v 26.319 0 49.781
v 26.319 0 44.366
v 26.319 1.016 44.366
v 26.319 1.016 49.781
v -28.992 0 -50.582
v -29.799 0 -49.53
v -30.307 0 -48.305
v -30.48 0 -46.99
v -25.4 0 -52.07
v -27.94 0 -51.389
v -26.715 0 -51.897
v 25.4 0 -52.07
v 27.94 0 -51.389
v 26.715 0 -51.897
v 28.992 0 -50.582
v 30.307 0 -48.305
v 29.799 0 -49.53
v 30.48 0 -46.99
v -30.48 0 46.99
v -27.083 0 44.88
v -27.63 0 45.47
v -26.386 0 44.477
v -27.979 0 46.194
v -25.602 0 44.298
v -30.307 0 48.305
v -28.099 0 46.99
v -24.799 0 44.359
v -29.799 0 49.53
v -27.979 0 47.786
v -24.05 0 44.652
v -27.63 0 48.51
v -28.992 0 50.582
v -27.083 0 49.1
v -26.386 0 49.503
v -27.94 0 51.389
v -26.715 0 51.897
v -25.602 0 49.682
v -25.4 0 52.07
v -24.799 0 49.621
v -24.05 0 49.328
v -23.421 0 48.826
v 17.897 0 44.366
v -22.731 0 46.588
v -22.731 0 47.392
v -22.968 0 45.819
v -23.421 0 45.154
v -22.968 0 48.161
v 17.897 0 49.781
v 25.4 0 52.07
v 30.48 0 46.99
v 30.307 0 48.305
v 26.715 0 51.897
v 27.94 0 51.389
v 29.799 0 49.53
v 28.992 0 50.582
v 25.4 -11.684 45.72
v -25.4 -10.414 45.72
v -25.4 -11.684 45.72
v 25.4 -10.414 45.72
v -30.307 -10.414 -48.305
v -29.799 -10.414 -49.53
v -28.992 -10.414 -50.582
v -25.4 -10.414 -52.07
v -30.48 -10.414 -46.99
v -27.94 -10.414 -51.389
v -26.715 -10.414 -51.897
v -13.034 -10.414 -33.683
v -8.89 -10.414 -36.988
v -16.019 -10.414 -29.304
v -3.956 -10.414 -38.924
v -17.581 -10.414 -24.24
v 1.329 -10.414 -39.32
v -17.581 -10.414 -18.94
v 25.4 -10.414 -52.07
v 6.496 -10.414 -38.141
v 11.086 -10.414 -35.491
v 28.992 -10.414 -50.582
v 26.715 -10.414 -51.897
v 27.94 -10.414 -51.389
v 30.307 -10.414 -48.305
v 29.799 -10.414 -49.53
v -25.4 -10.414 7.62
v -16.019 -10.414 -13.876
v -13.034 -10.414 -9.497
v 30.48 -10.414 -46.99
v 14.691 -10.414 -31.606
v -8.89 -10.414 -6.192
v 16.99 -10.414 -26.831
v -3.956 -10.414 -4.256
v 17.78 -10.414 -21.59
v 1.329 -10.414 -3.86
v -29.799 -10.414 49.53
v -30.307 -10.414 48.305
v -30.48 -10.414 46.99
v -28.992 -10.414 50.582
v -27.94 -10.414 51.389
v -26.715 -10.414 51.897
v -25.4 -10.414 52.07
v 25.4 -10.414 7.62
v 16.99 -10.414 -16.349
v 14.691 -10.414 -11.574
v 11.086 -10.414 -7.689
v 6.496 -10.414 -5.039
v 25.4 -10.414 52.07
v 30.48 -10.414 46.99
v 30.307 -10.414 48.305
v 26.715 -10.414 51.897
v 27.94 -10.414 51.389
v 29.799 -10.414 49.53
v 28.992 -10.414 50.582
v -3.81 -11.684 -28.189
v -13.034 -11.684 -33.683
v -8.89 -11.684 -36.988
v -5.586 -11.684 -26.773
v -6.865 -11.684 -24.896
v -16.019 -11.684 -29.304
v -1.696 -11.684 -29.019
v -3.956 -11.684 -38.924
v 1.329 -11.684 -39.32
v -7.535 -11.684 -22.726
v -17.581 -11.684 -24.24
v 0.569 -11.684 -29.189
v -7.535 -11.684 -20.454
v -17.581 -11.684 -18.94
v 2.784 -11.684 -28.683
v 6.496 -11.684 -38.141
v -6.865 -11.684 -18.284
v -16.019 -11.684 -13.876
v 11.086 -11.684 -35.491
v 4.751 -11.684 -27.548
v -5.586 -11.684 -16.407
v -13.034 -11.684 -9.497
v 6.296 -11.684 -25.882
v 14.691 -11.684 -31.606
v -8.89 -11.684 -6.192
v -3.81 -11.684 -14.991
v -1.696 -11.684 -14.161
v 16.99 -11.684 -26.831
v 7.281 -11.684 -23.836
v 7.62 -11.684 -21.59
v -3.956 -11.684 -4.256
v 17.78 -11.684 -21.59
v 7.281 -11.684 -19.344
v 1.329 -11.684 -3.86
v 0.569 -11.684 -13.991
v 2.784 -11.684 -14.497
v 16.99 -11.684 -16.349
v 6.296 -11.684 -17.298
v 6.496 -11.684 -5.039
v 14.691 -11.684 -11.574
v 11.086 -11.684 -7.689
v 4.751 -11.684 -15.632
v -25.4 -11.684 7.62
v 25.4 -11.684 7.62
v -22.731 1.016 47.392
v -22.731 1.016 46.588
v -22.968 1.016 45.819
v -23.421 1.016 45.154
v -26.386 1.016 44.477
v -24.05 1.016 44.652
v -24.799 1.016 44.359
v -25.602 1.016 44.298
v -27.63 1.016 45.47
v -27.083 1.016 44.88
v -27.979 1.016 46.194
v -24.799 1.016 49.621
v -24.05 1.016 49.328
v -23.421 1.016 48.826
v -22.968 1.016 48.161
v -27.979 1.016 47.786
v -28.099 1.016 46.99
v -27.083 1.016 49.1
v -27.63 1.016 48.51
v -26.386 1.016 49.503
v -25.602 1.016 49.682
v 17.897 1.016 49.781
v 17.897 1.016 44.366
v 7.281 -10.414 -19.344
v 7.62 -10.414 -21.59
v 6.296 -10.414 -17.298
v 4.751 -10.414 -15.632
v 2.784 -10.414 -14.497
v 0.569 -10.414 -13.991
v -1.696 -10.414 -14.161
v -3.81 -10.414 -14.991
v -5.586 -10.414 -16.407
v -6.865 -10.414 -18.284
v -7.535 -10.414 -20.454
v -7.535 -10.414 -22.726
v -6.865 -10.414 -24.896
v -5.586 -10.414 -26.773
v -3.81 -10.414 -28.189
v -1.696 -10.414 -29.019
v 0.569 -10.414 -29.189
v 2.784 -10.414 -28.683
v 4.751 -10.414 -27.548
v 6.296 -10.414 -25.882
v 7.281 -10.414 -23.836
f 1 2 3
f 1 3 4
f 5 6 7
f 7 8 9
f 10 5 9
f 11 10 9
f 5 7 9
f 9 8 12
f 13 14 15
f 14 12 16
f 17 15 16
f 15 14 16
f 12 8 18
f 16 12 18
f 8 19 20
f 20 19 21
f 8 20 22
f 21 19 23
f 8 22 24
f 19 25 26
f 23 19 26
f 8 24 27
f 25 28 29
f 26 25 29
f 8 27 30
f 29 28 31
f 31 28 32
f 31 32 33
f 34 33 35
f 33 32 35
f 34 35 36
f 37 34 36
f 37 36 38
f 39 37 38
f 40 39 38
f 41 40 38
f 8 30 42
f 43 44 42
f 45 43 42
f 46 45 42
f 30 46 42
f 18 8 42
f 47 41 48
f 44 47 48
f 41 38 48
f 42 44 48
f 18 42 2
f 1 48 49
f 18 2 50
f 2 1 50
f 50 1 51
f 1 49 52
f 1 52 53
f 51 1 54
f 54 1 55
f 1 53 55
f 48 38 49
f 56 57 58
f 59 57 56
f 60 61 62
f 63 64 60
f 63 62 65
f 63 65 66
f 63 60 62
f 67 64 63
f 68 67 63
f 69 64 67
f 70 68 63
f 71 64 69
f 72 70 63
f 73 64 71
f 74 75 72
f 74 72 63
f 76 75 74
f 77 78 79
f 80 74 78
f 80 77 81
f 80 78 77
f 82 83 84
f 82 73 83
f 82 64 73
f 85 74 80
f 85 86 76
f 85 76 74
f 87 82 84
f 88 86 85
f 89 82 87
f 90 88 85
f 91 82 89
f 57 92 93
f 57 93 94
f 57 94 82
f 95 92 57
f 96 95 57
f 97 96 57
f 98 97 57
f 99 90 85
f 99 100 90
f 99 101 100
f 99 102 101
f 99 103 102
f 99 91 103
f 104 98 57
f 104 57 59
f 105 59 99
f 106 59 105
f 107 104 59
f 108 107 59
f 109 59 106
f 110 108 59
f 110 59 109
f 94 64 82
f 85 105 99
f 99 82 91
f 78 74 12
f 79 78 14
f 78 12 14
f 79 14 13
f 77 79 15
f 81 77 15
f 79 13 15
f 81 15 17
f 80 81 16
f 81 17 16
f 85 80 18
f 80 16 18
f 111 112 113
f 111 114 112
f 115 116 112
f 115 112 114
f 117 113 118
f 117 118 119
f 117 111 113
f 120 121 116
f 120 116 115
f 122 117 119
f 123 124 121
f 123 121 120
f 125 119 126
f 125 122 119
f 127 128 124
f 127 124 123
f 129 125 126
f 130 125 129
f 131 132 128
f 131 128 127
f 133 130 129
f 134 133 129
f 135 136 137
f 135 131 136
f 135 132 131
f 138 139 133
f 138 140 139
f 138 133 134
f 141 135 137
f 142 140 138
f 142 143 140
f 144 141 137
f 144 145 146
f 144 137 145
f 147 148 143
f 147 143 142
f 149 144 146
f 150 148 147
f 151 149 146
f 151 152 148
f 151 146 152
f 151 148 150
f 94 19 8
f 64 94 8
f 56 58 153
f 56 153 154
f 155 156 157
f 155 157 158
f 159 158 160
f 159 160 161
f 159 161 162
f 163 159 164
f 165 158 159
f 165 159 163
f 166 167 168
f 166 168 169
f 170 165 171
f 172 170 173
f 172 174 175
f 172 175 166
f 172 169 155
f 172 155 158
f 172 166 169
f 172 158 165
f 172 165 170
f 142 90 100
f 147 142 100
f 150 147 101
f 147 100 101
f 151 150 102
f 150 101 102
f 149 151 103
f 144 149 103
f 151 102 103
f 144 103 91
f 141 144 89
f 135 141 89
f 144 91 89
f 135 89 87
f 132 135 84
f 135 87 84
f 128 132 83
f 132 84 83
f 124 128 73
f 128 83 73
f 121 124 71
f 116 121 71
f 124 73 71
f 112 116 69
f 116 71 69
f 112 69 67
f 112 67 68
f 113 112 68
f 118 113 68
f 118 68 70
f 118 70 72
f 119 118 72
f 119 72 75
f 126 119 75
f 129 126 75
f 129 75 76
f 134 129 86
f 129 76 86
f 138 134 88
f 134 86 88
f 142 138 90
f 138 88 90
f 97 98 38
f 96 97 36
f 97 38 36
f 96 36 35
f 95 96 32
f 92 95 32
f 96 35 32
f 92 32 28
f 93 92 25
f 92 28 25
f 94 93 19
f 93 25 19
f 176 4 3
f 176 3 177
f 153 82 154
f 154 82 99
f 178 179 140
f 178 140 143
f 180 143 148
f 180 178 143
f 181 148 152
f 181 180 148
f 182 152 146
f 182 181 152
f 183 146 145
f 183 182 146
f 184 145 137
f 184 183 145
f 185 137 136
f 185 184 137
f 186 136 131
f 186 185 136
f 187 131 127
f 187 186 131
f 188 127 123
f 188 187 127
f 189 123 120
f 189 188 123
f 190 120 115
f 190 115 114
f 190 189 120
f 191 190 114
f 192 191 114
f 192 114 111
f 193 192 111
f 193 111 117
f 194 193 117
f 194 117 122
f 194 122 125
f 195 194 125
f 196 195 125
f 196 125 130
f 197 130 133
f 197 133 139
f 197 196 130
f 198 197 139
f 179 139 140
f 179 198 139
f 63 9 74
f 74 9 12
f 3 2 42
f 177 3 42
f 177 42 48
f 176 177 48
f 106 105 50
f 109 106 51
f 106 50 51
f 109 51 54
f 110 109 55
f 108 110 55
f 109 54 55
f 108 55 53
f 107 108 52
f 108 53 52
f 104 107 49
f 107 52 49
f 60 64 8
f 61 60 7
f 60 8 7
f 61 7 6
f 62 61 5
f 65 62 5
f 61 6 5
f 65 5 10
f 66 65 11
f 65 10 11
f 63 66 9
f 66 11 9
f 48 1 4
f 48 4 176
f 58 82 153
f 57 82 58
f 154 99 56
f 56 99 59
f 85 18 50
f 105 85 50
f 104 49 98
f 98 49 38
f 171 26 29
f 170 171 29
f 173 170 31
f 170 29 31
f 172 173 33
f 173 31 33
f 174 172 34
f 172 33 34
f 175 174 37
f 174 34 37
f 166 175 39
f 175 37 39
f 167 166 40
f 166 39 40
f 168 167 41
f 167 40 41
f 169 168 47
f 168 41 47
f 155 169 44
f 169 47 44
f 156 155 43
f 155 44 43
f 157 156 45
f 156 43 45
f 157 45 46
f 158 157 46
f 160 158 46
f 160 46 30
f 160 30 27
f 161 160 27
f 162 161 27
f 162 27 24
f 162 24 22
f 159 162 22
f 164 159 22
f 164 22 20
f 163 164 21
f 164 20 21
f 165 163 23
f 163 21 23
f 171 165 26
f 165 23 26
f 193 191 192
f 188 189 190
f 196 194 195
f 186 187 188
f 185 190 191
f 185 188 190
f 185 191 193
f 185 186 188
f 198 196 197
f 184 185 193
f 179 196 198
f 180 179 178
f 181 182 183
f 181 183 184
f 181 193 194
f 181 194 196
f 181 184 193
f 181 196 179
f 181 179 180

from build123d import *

# Parameters (mm, degrees)
F1_DEPTH = 10.414
F2_W     = 50.8
F2_H     = 38.1
F2_R     = 17.78
F2_R_2   = 7.62
F3_DEPTH = 1.27
F4_R     = 2.69915
F4_W     = 8.422103
F4_H     = 5.414218
F5_DEPTH = 1.016


with BuildPart() as f1:
    # F0 (on Front) → F1 (new body)
    with BuildSketch(Plane.XZ):
        with BuildLine():
            ThreePointArc((30.48, 46.99), (28.992102, 50.582102), (25.4, 52.07))
            Line((25.4, 52.07), (-25.4, 52.07))
            ThreePointArc((-25.4, 52.07), (-28.992102, 50.582102), (-30.48, 46.99))
            Line((-30.48, 46.99), (-30.48, -46.99))
            ThreePointArc((-30.48, -46.99), (-28.992102, -50.582102), (-25.4, -52.07))
            Line((-25.4, -52.07), (25.4, -52.07))
            ThreePointArc((25.4, -52.07), (28.992102, -50.582102), (30.48, -46.99))
            Line((30.48, -46.99), (30.48, 46.99))
        make_face()
    extrude(amount=F1_DEPTH)

    # F2 (on face) → F3 (join)
    with BuildSketch(Plane.XZ.offset(10.414)):
        with Locations((0, 26.67)):
            Rectangle(F2_W, F2_H)
        with Locations((0, -21.59)):
            Circle(F2_R)
        with Locations((0, -21.59)):
            Circle(F2_R_2, mode=Mode.SUBTRACT)
    extrude(amount=F3_DEPTH)

    # F4 (on face) → F5 (join)
    with BuildSketch(Plane(origin=(0, 0, 0), x_dir=(-1, 0, 0), z_dir=(0, 1, 0))):
        with Locations((25.4, 46.99)):
            Circle(F4_R)
        with Locations((-22.108027, 47.073554)):
            Rectangle(F4_W, F4_H)
    extrude(amount=F5_DEPTH)


solid = f1.part
